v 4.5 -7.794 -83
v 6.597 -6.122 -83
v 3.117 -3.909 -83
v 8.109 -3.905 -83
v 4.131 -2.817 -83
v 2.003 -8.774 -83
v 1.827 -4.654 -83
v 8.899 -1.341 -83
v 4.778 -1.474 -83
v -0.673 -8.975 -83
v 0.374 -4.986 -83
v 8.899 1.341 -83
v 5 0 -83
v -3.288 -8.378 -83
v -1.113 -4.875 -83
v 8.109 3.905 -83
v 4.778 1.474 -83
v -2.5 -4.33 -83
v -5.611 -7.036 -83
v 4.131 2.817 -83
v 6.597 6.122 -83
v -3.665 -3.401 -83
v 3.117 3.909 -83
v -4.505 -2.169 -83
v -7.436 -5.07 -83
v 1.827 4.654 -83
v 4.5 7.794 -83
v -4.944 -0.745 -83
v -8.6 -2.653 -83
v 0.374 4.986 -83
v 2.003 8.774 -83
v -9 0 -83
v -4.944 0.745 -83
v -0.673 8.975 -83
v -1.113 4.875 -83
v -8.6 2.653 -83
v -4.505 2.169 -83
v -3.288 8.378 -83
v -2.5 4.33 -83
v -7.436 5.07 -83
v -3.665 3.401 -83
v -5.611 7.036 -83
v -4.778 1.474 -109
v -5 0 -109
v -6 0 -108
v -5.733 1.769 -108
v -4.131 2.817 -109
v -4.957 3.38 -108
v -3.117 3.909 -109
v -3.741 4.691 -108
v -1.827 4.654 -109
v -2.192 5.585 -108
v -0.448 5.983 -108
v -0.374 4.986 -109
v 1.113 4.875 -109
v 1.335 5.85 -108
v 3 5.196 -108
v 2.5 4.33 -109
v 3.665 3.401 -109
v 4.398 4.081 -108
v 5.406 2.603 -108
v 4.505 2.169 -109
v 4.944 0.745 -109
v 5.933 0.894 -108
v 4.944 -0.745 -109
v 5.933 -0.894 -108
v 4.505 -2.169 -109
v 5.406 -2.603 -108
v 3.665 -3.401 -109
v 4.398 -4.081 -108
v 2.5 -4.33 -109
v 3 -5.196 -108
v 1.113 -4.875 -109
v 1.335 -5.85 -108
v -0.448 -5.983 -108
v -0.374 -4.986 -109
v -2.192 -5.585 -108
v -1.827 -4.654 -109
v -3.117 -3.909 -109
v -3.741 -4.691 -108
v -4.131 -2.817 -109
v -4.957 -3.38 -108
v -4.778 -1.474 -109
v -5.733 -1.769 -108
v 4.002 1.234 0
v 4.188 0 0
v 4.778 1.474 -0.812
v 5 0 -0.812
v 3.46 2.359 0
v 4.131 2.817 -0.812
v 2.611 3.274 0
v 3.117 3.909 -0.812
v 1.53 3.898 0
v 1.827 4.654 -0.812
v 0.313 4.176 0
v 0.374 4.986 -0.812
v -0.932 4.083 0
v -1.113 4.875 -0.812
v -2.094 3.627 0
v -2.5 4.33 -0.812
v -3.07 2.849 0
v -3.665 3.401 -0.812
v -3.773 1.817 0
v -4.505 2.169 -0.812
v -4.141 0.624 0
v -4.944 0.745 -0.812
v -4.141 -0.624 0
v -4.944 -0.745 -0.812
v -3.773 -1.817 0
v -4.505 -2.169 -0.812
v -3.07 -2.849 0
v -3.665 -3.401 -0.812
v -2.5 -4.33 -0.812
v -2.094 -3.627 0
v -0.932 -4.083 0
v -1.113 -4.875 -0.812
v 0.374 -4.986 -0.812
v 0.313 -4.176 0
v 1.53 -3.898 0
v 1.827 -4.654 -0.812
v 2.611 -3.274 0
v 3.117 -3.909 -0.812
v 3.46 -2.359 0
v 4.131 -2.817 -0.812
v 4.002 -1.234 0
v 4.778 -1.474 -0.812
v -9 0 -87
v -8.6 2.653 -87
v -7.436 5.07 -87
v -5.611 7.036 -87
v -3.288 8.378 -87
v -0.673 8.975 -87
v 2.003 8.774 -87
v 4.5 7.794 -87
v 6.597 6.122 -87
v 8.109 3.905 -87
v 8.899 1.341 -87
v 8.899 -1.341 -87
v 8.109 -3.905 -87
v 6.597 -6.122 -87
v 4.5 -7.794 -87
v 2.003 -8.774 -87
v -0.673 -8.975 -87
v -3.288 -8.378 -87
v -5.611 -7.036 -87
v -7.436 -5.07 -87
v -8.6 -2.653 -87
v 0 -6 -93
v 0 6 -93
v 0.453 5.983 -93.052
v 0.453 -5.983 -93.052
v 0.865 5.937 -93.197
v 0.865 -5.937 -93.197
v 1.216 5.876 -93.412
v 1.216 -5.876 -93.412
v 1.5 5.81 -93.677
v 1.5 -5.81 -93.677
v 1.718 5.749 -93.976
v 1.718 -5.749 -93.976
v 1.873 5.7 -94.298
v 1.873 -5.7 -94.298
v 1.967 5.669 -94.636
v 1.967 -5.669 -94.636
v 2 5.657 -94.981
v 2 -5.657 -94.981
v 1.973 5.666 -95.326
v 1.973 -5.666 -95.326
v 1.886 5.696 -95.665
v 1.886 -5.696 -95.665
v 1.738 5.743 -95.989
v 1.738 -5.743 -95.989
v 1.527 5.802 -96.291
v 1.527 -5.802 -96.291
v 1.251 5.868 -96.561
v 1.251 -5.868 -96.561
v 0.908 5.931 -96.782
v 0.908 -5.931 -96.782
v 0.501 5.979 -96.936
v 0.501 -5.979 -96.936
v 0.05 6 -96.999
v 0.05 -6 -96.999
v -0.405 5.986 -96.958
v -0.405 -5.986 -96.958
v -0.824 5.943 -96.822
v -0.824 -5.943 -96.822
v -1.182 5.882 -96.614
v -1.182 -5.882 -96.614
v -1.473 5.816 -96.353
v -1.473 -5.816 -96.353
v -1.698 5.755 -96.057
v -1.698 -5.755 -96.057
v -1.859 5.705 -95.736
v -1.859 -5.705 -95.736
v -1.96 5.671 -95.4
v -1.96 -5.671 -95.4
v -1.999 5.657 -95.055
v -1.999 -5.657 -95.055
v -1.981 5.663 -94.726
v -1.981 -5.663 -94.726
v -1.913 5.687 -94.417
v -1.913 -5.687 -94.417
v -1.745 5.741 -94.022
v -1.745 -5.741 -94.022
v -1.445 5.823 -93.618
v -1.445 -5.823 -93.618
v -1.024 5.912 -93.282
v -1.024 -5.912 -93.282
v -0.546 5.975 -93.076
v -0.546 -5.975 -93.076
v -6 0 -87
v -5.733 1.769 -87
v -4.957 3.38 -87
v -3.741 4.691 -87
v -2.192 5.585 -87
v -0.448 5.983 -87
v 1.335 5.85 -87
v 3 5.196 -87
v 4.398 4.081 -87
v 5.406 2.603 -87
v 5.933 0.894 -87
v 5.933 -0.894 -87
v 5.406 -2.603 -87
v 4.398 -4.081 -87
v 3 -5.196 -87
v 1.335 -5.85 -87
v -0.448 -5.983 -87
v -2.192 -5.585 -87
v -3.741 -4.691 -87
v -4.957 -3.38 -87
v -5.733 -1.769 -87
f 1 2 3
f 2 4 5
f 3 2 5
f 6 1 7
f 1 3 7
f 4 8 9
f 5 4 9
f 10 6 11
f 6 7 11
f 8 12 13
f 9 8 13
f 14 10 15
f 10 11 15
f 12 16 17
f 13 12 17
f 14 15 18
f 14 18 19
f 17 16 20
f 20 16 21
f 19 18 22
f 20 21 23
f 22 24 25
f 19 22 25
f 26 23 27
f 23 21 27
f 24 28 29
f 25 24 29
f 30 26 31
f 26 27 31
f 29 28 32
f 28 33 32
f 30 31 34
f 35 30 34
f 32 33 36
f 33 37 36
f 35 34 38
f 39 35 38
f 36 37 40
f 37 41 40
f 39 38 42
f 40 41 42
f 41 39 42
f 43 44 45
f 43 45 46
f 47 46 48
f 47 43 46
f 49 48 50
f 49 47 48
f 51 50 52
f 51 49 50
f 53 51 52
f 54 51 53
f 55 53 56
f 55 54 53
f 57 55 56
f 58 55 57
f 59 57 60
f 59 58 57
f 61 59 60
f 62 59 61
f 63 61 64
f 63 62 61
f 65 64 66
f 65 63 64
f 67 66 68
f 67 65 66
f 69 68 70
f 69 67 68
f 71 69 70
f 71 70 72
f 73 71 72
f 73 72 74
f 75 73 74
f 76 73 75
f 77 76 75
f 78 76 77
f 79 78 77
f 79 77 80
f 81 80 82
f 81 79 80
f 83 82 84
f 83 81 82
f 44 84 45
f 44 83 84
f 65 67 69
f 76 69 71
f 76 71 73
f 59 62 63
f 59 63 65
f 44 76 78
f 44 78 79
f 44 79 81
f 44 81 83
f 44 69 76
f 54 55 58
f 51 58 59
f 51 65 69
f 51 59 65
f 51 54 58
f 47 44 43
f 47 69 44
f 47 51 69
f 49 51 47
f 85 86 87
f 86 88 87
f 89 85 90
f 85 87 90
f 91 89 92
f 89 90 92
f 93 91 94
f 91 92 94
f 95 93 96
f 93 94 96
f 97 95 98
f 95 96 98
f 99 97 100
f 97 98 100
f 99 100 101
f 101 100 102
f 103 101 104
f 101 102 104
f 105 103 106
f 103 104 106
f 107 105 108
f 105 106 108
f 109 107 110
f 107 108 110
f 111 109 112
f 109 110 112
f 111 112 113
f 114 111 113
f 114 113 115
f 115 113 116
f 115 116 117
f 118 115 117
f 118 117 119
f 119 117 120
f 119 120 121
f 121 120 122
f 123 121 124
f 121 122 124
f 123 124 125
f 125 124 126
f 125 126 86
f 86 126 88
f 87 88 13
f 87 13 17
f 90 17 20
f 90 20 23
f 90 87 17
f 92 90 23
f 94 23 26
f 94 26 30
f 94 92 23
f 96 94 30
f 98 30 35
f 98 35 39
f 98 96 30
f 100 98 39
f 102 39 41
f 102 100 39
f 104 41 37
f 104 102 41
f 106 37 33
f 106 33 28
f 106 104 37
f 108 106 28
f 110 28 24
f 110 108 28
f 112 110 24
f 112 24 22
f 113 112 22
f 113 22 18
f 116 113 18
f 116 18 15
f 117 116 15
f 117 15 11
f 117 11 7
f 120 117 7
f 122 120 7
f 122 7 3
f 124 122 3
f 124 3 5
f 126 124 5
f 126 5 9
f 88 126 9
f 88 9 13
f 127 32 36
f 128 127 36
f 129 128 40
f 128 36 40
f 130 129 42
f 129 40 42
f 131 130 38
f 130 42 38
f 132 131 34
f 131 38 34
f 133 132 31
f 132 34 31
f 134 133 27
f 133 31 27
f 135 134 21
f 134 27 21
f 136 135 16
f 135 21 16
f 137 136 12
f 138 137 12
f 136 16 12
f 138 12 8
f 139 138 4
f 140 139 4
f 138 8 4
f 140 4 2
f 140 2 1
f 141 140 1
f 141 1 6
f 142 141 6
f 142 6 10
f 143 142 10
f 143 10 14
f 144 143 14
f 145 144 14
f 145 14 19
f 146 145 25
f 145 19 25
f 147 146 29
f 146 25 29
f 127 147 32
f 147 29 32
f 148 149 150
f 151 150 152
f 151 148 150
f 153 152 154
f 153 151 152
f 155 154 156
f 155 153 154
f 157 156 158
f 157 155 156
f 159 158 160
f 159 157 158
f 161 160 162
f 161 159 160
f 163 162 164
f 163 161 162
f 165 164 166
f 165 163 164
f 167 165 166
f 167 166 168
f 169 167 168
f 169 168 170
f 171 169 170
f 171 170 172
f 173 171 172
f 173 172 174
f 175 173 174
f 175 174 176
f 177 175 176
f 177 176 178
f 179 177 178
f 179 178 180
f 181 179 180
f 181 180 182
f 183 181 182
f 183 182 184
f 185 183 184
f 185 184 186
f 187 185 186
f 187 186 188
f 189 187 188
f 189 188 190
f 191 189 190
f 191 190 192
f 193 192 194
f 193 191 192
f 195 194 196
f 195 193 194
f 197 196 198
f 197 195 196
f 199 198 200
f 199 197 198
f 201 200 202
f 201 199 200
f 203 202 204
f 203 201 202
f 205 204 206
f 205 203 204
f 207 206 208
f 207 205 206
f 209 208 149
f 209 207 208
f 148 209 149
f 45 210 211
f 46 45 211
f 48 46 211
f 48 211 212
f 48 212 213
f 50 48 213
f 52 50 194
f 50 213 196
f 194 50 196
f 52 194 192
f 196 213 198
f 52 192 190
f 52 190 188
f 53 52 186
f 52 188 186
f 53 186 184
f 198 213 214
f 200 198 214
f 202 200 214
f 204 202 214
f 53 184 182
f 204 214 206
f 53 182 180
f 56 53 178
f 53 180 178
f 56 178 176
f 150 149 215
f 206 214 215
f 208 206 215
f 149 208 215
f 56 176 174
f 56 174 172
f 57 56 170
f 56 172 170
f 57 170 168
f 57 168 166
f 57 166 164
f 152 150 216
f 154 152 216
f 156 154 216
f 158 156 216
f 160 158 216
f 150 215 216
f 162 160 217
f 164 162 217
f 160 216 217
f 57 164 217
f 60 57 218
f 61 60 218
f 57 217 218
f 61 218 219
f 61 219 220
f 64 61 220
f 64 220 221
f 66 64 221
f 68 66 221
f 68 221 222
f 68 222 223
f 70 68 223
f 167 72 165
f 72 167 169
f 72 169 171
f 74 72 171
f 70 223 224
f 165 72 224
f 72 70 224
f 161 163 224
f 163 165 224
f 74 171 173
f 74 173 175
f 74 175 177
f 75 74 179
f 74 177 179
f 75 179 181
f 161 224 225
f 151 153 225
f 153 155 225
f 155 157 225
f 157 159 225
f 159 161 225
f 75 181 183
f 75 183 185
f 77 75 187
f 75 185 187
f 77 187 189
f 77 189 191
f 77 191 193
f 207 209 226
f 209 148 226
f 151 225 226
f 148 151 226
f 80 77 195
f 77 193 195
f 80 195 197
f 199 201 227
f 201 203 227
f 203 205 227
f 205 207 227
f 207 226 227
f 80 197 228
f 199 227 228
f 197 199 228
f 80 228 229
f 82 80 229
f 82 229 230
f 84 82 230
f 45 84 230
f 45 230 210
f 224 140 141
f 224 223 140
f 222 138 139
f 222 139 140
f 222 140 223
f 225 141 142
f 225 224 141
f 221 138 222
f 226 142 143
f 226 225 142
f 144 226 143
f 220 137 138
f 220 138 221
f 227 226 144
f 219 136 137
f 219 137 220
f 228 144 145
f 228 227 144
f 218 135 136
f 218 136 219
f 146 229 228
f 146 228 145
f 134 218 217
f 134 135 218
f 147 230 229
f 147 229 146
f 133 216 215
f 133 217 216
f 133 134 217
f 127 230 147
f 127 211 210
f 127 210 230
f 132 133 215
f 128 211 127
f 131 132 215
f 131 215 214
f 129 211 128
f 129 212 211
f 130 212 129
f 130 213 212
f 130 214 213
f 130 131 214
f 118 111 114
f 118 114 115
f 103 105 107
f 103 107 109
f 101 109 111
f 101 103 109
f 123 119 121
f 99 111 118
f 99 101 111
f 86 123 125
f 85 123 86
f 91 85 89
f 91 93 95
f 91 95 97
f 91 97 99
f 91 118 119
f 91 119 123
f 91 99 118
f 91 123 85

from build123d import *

# Parameters (mm, degrees)
SKETCH_1_R               = 5
EXTRUDE_1_DEPTH          = 83
SKETCH_3_R               = 9
EXTRUDE_2_DEPTH          = 4
SKETCH_4_R               = 6
EXTRUDE_3_DEPTH          = 22
CUT_EXTRUDE_1_DEPTH      = 110.740603242
CUT_EXTRUDE_1_DEPTH_BACK = 110.740603242
SKETCH_5_R               = 2
CHAMFER_1_SIZE           = 1


# Read off the part's stored shape, not the designer's step: M10 机械螺纹 螺柱1
with BuildPart() as part:
    # 草图1 → 凸台-拉伸1 (new body)
    with BuildSketch(Plane.XY):
        Circle(SKETCH_1_R)
    extrude(amount=-EXTRUDE_1_DEPTH)

    # M10 机械螺纹 螺柱1 outline → M10 机械螺纹 螺柱1 (revolve, cut)
    with BuildSketch(Plane.XZ):
        Polygon((5, 0), (4.188, 0), (5, -0.812), align=None)
    revolve(axis=Axis((0, 0, 0), (0, 0, 1)), mode=Mode.SUBTRACT)

    # 草图3 → 凸台-拉伸2 (add)
    with BuildSketch(Plane(origin=(0, 0, -83), x_dir=(-1, 0, 0), z_dir=(0, 0, -1))):
        Circle(SKETCH_3_R)
    extrude(amount=EXTRUDE_2_DEPTH)

    # 草图4 → 凸台-拉伸3 (add)
    with BuildSketch(Plane(origin=(0, 0, -87), x_dir=(-1, 0, 0), z_dir=(0, 0, -1))):
        Circle(SKETCH_4_R)
    extrude(amount=EXTRUDE_3_DEPTH)

    # 草图5 → 切除-拉伸1 (cut, two sides: drawn at the far end of the back side and taken through both)
    with BuildSketch(Plane(origin=(0, 0, 0), x_dir=(1, 0, 0), z_dir=(0, 1, 0)).offset(-CUT_EXTRUDE_1_DEPTH_BACK)):
        with Locations(Location((0, 95, 0), (0, 0, 270))):
            Circle(SKETCH_5_R)
    extrude(amount=CUT_EXTRUDE_1_DEPTH + CUT_EXTRUDE_1_DEPTH_BACK, mode=Mode.SUBTRACT)

    # 倒角1
    chamfer_1_edges = [part.edges().sort_by_distance(p)[0] for p in [
        (6, 0, -109),
    ]]
    chamfer(chamfer_1_edges, length=CHAMFER_1_SIZE)


solid = part.part
